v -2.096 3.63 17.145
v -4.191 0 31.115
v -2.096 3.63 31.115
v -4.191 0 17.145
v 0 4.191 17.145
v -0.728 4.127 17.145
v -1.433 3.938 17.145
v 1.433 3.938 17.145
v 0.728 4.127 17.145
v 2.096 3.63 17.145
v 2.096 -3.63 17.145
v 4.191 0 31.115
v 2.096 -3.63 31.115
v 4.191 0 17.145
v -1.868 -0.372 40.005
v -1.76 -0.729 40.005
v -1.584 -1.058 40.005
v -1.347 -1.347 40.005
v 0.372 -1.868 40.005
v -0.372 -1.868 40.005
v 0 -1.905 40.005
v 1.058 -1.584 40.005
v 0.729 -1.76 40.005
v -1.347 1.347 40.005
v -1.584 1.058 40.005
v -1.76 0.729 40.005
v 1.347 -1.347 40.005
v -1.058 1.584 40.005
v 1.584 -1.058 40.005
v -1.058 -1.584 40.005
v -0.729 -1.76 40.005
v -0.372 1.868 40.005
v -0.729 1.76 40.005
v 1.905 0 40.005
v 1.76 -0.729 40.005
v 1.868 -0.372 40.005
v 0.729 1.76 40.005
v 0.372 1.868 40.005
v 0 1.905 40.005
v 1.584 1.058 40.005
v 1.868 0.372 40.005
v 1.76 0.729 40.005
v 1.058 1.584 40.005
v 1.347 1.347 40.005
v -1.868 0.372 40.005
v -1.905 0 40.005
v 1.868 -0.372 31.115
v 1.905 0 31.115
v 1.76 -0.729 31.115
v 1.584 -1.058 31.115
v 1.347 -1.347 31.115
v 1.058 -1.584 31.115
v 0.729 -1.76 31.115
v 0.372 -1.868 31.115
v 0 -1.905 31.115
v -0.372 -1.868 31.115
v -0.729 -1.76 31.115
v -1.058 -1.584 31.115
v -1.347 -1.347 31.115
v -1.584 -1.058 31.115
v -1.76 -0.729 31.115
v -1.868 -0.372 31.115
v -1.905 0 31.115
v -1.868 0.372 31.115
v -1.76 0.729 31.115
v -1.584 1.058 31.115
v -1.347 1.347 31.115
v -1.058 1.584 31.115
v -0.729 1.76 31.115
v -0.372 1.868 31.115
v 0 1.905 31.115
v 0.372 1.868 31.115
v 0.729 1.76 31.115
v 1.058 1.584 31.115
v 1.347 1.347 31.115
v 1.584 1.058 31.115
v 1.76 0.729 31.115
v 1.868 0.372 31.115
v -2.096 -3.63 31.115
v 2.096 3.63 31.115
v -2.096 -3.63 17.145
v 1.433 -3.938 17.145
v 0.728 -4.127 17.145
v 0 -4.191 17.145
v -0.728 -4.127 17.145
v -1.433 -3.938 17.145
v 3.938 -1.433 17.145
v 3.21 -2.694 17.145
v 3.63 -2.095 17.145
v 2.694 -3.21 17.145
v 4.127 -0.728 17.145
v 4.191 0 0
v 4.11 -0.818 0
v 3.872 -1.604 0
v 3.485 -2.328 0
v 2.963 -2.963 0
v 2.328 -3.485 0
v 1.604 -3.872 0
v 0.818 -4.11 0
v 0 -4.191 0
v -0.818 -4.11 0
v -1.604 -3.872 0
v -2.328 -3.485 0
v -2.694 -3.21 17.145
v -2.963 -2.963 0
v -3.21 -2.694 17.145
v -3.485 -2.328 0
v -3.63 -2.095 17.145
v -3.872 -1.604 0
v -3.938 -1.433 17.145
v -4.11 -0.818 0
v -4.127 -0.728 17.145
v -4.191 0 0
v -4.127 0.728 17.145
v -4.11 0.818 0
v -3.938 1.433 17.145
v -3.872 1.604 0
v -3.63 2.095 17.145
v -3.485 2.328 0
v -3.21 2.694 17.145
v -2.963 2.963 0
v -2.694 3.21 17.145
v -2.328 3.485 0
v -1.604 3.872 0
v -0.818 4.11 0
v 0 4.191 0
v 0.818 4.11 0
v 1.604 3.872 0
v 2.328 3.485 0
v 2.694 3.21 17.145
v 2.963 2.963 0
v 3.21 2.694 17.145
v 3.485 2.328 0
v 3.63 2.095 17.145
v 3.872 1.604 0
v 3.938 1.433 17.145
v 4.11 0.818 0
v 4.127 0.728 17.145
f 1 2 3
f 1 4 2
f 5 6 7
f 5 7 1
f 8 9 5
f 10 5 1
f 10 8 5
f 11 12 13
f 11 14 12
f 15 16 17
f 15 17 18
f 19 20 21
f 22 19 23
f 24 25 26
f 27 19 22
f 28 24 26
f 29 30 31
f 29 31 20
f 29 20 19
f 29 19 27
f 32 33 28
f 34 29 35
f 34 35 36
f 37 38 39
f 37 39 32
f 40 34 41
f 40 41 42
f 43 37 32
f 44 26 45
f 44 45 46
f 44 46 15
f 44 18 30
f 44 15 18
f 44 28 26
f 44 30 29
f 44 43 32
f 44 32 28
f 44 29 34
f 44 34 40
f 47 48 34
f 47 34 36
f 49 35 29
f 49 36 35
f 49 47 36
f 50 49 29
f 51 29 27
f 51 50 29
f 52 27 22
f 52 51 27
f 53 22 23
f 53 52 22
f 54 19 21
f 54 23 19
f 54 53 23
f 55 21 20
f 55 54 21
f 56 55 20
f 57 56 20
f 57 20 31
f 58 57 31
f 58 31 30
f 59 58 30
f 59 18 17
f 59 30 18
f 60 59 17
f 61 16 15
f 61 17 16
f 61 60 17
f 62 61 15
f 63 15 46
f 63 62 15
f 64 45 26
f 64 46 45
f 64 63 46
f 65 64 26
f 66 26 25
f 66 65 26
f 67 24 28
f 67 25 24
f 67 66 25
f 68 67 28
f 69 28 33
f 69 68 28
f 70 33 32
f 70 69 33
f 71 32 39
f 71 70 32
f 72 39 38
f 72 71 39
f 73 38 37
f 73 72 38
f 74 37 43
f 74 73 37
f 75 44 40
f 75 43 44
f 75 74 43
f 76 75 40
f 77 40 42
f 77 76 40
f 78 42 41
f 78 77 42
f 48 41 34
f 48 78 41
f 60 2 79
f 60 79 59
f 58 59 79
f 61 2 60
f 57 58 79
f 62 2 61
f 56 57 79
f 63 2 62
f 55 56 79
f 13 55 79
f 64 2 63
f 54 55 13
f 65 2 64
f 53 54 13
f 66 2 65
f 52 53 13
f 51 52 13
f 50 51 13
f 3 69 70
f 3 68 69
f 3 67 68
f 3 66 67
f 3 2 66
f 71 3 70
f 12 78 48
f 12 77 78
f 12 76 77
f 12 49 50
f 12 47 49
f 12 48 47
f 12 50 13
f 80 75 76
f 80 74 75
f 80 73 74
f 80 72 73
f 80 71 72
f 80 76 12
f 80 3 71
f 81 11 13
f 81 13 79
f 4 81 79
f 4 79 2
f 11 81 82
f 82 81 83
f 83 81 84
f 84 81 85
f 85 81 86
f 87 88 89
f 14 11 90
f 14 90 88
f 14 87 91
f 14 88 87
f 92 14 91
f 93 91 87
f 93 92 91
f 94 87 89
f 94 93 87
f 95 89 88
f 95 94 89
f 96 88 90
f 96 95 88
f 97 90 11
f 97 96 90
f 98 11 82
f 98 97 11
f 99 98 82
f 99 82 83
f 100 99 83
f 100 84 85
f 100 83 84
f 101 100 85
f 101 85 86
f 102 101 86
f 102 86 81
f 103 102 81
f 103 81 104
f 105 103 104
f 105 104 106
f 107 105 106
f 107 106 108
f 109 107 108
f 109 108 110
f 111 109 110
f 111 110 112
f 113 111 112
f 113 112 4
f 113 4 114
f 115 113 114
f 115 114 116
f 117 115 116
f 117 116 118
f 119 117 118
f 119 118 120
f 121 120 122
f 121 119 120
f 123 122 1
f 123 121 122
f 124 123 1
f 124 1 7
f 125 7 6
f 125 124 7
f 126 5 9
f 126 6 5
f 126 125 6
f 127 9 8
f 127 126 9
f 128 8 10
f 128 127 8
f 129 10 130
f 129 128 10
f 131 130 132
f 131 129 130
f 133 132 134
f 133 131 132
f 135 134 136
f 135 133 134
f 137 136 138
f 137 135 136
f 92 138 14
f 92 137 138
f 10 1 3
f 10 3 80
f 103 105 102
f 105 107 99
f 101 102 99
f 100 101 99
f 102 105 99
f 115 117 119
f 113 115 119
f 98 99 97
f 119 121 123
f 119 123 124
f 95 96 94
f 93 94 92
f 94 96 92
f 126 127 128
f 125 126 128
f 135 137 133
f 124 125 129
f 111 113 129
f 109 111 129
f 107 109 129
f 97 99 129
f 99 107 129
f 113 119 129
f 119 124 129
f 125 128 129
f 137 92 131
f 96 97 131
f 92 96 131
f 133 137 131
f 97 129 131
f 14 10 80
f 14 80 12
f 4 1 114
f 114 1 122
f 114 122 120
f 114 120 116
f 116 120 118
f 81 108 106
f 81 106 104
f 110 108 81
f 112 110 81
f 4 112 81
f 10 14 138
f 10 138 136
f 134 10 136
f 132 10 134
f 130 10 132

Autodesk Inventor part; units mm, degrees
ref_plane "YZ Plane" through (0, 0, 0) normal (1, 0, 0) x (0, 1, 0)
ref_plane "XZ Plane" through (0, 0, 0) normal (0, 1, 0) x (-1, 0, 0)
sketch "Sketch1" plane through (0, 0, 0) normal (0, 0, 1) x (1, 0, 0)
  circle A0 centre (0, 0) radius 4.191 projected
  circle A1 centre (0, 0) radius 4.191
  point P0 (0, 0)
ref_plane "Work Plane1" through (-10.4775, -10.4775, 12.7) normal (0, 0, 1) x (1, 0, 0)
extrude "Extrusion1" add sketch "Sketch1" along normal blind 17.145
sketch "Sketch2" plane through (0, 0, 17.145) normal (0, 0, 1) x (1, 0, 0)
  circle A0 centre (0, 0) radius 4.191 projected
  line L0 (-2.0955, -3.6295) -> (-4.191, 0)
  line L1 (-4.191, 0) -> (-2.0955, 3.6295)
  line L2 (-2.0955, 3.6295) -> (2.0955, 3.6295)
  line L3 (2.0955, 3.6295) -> (4.191, 0)
  line L4 (4.191, 0) -> (2.0955, -3.6295)
  line L5 (2.0955, -3.6295) -> (-2.0955, -3.6295)
  point P0 (0, 0)
  point P1 (0, 0)
extrude "Extrusion2" add sketch "Sketch2" along normal blind 13.97 contours L4 L5 L0 L1 L2 L3
sketch "Sketch3" plane through (0, 0, 31.115) normal (0, 0, 1) x (1, 0, 0)
  circle A0 centre (0, 0) radius 1.905
  dimension "d4" = 3.81
extrude "Extrusion3" add sketch "Sketch3" along normal blind 8.89
properties part number "Wheel_Pin"
